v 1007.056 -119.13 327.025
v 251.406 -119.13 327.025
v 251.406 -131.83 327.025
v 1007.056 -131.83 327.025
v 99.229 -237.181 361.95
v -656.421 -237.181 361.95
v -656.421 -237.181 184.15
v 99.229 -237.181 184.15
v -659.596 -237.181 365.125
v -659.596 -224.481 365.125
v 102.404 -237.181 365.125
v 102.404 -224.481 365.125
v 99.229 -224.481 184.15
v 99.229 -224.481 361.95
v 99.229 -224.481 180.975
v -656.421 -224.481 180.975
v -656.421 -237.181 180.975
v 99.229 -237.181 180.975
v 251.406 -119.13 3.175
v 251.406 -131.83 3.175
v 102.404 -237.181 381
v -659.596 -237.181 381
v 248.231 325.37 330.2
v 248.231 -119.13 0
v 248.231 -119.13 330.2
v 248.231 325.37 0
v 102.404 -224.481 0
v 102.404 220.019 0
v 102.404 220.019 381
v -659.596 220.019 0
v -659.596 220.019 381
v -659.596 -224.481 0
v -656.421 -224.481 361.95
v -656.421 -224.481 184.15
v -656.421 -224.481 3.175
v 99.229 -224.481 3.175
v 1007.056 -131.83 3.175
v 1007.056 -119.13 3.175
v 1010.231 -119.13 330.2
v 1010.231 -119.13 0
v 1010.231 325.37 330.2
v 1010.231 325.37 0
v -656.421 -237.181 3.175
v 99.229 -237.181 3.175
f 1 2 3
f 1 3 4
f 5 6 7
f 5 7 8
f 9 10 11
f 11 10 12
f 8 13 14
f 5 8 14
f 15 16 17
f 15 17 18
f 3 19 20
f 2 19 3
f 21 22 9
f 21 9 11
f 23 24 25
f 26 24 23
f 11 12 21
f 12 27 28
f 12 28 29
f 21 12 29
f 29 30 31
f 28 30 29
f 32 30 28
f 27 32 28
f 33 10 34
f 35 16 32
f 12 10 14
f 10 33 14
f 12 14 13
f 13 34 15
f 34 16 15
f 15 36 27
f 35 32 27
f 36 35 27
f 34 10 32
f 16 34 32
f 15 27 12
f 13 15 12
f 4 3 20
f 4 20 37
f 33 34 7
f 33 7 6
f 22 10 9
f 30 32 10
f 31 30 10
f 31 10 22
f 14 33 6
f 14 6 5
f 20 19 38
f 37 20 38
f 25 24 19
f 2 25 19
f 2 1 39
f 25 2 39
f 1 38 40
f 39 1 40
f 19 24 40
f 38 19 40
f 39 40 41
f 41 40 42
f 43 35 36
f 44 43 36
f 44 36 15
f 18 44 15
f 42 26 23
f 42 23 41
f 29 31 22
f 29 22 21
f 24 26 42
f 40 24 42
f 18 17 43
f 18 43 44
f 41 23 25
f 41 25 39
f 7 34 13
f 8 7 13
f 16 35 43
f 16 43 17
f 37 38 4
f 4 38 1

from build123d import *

# Parameters (mm, degrees)
F0_W     = 762
F0_H     = 444.5
F1_DEPTH = 381
F2_W     = 755.65
F2_H     = 177.8
F2_W_2   = 762
F2_H_2   = 15.875
F3_DEPTH = 12.7
F4_W     = 762
F4_H     = 444.5
F5_DEPTH = 330.2
F6_W     = 755.65
F6_H     = 323.85
F7_DEPTH = 12.7


with BuildPart() as f1:
    # F0 (on Top) → F1 (new body)
    with BuildSketch(Plane.XY):
        with Locations((-278.595738, -2.230618)):
            Rectangle(F0_W, F0_H)
    extrude(amount=F1_DEPTH)

    # F2 (on face) → F3 (join)
    with BuildSketch(Plane.XZ.offset(224.480618)):
        with Locations((-278.595738, 92.075)):
            Rectangle(F2_W, F2_H)
        with Locations((-278.595738, 273.05)):
            Rectangle(F2_W, F2_H)
        with Locations((-278.595738, 373.0625)):
            Rectangle(F2_W_2, F2_H_2)
    extrude(amount=F3_DEPTH)


with BuildPart() as f5:
    # F4 (on Top) → F5 (new body)
    with BuildSketch(Plane.XY):
        with Locations((629.230523, 103.11974)):
            Rectangle(F4_W, F4_H)
    extrude(amount=F5_DEPTH)

    # F6 (on face) → F7 (join)
    with BuildSketch(Plane.XZ.offset(119.13026)):
        with Locations((629.230523, 165.1)):
            Rectangle(F6_W, F6_H)
    extrude(amount=F7_DEPTH)


solid = Compound([f1.part, f5.part])
